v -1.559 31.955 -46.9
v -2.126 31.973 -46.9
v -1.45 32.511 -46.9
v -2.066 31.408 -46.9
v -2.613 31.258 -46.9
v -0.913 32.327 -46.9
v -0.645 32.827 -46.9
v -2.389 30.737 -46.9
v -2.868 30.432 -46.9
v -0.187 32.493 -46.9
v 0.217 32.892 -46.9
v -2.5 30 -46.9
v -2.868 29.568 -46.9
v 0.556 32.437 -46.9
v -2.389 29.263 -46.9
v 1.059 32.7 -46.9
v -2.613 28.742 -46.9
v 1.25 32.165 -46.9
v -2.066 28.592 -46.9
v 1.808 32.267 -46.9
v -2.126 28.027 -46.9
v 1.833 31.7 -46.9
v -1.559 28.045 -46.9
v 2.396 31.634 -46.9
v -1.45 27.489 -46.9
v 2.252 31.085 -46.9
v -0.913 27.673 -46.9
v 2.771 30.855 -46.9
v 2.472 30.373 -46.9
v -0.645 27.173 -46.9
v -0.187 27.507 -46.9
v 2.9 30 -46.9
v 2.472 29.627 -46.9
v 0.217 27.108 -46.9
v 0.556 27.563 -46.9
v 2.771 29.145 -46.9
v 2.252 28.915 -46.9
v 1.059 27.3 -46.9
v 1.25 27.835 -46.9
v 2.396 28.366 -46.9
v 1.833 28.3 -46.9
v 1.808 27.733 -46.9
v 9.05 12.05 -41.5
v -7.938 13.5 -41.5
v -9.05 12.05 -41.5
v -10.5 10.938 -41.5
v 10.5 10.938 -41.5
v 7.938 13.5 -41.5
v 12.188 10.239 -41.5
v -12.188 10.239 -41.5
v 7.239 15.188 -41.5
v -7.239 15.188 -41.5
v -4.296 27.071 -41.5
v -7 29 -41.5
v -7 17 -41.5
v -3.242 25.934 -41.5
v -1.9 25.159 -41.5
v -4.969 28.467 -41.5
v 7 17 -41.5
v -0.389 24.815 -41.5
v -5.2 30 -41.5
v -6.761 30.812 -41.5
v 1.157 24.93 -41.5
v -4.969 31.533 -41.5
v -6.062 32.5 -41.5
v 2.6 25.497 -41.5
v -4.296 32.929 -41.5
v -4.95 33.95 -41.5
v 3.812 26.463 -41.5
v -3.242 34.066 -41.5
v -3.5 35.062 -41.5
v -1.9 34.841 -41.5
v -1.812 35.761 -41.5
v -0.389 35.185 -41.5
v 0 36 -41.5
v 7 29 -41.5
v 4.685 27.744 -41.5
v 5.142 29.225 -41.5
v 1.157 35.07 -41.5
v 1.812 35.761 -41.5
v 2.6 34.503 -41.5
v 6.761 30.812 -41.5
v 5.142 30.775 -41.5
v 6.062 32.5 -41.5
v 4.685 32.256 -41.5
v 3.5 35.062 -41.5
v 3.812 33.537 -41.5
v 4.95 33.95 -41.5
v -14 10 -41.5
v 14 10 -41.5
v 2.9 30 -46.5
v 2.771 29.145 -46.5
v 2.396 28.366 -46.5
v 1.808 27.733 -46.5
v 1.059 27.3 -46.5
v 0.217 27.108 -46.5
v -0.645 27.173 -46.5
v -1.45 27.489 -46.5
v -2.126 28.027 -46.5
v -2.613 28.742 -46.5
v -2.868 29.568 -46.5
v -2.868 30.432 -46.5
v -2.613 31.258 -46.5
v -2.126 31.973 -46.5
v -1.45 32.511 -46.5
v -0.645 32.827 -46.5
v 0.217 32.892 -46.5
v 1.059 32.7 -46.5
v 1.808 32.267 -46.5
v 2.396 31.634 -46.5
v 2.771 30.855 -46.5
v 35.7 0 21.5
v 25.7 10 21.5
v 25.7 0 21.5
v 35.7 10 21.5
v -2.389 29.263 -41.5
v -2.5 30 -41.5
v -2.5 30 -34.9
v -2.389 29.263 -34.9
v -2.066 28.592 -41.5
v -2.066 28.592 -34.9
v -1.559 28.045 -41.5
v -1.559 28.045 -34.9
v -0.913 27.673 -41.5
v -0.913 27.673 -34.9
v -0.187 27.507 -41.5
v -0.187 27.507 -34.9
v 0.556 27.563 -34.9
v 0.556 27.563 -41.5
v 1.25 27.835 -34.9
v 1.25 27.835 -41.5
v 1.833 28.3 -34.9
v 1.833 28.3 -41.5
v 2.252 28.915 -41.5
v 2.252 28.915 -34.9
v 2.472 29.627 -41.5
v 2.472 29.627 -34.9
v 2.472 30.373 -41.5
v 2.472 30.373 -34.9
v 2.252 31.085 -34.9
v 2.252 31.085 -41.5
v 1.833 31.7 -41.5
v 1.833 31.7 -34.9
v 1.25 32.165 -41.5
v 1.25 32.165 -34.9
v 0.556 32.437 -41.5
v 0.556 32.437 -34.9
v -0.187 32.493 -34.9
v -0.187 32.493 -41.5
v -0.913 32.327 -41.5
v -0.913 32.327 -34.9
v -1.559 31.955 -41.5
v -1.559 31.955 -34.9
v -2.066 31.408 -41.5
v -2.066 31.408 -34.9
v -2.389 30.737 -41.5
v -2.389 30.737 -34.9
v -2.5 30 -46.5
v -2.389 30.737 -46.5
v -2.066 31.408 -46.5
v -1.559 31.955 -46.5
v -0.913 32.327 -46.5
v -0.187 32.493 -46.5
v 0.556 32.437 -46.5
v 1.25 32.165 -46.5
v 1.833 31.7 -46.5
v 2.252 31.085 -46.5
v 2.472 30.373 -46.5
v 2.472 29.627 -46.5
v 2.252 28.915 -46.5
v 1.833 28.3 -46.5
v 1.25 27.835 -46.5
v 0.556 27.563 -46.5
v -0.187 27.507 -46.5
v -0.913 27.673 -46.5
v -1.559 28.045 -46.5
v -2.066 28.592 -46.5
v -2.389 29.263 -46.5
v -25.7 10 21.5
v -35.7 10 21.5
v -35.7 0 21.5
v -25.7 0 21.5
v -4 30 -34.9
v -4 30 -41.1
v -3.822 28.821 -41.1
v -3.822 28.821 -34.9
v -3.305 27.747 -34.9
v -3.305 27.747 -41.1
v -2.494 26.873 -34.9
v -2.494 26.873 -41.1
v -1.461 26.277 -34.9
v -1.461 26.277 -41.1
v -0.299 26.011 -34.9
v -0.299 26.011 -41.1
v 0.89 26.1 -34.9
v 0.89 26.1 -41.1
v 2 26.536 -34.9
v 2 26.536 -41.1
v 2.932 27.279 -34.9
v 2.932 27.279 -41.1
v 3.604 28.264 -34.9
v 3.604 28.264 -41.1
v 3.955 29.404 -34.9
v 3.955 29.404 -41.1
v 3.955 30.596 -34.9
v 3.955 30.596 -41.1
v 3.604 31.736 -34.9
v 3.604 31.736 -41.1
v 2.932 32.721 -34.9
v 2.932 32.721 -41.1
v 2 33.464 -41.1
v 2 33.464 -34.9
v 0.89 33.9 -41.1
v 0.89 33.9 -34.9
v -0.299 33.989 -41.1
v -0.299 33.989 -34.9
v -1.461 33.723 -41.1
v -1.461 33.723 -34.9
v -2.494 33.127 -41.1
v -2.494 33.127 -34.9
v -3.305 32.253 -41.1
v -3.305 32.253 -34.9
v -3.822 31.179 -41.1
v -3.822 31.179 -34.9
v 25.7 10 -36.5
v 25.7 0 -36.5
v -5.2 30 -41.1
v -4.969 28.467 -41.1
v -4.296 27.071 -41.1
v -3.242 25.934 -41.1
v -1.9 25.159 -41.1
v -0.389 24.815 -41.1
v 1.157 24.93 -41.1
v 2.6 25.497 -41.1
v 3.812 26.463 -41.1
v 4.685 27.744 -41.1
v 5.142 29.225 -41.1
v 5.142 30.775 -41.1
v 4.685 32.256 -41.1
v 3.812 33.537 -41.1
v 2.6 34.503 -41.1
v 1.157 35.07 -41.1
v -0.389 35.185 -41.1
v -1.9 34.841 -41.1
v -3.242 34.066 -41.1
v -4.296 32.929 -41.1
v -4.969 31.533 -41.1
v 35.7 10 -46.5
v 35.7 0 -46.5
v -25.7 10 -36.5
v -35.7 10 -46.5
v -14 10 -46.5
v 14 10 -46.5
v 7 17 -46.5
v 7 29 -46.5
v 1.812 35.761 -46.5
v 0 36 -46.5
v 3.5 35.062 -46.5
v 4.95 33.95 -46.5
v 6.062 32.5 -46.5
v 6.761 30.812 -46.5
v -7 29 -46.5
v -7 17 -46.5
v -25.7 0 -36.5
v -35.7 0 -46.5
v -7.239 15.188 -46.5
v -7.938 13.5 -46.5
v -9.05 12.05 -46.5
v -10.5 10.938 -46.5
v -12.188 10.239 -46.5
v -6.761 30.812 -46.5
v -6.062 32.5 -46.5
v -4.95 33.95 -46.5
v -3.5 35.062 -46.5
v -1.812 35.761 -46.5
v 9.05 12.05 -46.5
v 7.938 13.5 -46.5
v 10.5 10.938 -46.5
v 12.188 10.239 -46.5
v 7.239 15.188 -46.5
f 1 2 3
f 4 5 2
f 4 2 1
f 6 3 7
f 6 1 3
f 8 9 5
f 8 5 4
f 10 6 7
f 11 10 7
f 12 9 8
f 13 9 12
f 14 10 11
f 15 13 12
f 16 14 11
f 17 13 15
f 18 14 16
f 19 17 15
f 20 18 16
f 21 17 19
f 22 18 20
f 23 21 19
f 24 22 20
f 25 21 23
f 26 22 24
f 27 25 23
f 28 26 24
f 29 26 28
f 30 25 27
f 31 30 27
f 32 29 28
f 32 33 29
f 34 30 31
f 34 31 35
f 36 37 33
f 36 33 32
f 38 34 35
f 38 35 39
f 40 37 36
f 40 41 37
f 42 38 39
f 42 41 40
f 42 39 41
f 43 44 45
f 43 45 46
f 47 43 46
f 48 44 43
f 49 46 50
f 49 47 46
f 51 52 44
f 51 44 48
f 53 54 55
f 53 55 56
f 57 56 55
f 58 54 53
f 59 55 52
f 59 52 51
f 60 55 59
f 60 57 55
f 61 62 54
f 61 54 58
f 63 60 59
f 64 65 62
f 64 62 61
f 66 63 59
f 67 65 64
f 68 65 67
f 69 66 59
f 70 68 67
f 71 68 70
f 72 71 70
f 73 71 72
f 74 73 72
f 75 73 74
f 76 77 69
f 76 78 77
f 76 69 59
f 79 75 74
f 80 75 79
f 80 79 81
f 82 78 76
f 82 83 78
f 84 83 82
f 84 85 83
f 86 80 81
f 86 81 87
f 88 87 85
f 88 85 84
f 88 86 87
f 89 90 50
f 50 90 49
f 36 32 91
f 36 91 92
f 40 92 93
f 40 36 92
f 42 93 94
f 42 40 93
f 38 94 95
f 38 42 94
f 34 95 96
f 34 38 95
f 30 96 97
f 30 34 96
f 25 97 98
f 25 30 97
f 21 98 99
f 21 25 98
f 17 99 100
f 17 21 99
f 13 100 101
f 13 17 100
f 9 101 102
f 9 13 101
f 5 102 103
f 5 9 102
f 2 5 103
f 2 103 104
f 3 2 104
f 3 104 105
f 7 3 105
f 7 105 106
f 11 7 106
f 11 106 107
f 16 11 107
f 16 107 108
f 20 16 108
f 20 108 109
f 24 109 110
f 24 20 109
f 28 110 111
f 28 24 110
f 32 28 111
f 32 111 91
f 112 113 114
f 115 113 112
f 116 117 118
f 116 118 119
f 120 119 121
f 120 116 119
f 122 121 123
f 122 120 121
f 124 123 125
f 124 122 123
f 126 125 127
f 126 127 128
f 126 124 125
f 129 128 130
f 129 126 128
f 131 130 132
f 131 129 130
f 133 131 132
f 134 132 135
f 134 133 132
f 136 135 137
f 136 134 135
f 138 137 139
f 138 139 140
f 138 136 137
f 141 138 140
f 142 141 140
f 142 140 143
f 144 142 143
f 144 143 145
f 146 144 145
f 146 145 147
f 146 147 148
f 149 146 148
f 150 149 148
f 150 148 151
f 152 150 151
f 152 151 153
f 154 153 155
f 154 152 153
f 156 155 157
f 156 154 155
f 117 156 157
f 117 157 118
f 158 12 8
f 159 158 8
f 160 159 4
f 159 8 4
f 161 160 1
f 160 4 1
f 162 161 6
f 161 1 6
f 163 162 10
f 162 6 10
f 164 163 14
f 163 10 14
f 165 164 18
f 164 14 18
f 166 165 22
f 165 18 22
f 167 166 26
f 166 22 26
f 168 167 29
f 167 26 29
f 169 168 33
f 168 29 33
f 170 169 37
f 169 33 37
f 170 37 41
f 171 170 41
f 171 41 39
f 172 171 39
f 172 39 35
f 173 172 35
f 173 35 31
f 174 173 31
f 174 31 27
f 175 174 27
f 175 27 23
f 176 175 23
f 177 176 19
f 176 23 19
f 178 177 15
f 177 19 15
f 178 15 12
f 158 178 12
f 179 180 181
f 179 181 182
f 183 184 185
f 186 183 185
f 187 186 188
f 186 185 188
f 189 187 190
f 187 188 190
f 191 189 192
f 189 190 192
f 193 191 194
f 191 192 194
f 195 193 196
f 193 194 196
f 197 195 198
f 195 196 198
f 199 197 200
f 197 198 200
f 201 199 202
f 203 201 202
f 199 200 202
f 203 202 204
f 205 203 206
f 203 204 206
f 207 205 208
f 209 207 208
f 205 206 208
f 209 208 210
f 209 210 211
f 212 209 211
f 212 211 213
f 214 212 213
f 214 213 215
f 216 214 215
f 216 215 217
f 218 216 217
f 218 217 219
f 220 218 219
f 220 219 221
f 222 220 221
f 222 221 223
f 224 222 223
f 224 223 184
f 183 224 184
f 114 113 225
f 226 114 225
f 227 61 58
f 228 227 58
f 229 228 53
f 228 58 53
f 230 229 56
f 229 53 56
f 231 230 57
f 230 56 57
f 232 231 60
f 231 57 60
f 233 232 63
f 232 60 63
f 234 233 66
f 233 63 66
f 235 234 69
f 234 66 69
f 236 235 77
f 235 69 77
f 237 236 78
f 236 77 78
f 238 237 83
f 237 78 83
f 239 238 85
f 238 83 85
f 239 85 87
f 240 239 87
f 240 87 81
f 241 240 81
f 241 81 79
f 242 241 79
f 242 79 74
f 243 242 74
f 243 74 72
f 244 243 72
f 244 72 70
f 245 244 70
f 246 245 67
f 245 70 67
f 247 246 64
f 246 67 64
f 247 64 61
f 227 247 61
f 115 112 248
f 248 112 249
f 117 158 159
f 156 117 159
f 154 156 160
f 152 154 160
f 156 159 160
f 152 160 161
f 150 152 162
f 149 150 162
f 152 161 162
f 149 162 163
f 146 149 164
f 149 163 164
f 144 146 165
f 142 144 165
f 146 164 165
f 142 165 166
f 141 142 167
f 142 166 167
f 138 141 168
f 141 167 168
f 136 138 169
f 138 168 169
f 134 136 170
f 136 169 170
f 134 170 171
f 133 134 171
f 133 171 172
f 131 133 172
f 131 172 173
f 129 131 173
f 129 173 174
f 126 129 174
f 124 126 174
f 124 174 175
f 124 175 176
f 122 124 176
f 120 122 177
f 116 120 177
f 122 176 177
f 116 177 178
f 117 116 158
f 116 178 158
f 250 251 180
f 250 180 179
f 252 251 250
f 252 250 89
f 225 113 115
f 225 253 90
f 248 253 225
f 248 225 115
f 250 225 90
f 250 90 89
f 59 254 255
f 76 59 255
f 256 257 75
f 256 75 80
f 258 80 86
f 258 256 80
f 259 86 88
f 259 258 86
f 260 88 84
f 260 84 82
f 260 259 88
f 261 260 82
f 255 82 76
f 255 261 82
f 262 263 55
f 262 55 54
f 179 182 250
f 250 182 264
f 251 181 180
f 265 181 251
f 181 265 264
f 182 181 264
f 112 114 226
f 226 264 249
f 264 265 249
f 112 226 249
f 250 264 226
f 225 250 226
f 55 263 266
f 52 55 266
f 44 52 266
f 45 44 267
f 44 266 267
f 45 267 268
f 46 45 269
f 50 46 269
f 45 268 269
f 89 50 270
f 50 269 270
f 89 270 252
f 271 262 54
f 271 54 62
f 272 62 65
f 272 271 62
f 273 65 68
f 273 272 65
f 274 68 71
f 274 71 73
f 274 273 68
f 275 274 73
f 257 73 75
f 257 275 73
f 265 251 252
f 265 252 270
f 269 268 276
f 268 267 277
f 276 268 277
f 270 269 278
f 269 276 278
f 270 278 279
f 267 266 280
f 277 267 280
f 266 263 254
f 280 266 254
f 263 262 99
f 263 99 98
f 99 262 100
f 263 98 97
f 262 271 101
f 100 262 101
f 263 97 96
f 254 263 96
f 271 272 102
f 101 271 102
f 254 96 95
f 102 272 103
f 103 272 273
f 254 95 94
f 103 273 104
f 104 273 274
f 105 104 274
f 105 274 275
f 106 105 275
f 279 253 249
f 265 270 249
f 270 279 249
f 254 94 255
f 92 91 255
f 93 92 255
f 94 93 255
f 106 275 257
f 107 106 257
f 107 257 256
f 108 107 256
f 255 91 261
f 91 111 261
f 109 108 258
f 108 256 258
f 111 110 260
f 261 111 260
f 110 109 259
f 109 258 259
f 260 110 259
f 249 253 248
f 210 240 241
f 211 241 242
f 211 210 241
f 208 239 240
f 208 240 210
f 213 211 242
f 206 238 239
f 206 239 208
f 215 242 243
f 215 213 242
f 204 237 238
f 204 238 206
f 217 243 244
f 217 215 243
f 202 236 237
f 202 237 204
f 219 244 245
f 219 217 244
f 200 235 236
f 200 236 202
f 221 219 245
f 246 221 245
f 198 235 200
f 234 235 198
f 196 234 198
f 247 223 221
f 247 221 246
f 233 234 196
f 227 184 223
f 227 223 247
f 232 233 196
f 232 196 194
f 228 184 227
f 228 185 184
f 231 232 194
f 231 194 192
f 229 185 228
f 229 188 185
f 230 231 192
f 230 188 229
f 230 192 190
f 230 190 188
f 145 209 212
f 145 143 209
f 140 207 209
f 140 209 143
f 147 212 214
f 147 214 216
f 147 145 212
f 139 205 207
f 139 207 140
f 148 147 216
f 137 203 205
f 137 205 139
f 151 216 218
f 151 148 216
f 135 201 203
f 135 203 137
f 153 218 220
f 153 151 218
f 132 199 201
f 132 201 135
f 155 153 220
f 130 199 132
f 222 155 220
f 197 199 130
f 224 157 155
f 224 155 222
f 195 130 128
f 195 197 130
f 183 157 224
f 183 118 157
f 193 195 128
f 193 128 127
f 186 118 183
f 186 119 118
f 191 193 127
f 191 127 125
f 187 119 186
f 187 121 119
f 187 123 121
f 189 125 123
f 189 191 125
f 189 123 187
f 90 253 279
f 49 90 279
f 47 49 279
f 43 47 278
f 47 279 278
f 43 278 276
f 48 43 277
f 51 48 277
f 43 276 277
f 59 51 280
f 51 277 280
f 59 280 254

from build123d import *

# Parameters (mm, degrees)
SKETCH2_W           = 71.4
SKETCH2_H           = 93
SKETCH2_W_2         = 51.4
SKETCH2_H_2         = 73
BOSS_EXTRUDE1_DEPTH = 10
SKETCH3_W           = 14
SKETCH3_H           = 26
SKETCH3_R           = 2.5
BOSS_EXTRUDE2_DEPTH = 5
SKETCH4_R           = 4
SKETCH4_R_2         = 2.5
BOSS_EXTRUDE3_DEPTH = 6.6
SKETCH5_W           = 51.4
SKETCH5_H           = 10
CUT_EXTRUDE1_DEPTH  = 65.130647899
SKETCH6_R           = 5.2
SKETCH6_R_2         = 4
BOSS_EXTRUDE4_DEPTH = 0.4
SKETCH7_W           = 71.4
SKETCH7_H           = 25
CUT_EXTRUDE2_DEPTH  = 65.130647899
BOSS_EXTRUDE5_START = 0.4
SKETCH8_R           = 2.9
SKETCH8_R_2         = 2.5
BOSS_EXTRUDE5_DEPTH = 0.4
FILLET1_START       = -46.5
FILLET1_DEPTH       = 5
FILLET1_2_DEPTH     = 5


with BuildPart() as part:
    # Sketch2 → Boss-Extrude1 (new body)
    with BuildSketch(Plane(origin=(0, 0, 0), x_dir=(1, 0, 0), z_dir=(0, 1, 0))):
        Rectangle(SKETCH2_W, SKETCH2_H)
        Rectangle(SKETCH2_W_2, SKETCH2_H_2, mode=Mode.SUBTRACT)
    extrude(amount=BOSS_EXTRUDE1_DEPTH)

    # Sketch3 → Boss-Extrude2 (add)
    with BuildSketch(Plane(origin=(0, 0, -46.5), x_dir=(-1, 0, 0), z_dir=(0, 0, -1))):
        with Locations((0, 23)):
            Rectangle(SKETCH3_W, SKETCH3_H)
        with Locations((0, 30)):
            Circle(SKETCH3_R, mode=Mode.SUBTRACT)
    extrude(amount=-BOSS_EXTRUDE2_DEPTH)

    # Sketch4 → Boss-Extrude3 (add)
    with BuildSketch(Plane.XY.offset(-41.5)):
        with Locations(Location((0, 30, 0), (0, 0, 180))):
            Circle(SKETCH4_R)
        with Locations(Location((0, 30, 0), (0, 0, 180))):
            Circle(SKETCH4_R_2, mode=Mode.SUBTRACT)
    extrude(amount=BOSS_EXTRUDE3_DEPTH)

    # Sketch5 → Cut-Extrude1 (cut, through all)
    with BuildSketch(Plane(origin=(0, 10, 0), x_dir=(1, 0, 0), z_dir=(0, 1, 0))):
        with Locations((0, -41.5)):
            Rectangle(SKETCH5_W, SKETCH5_H)
    extrude(amount=-CUT_EXTRUDE1_DEPTH, mode=Mode.SUBTRACT)

    # Sketch6 → Boss-Extrude4 (add)
    with BuildSketch(Plane.XY.offset(-41.5)):
        with Locations(Location((0, 30, 0), (0, 0, 180))):
            Circle(SKETCH6_R)
        with Locations((0, 30)):
            Circle(SKETCH6_R_2, mode=Mode.SUBTRACT)
    extrude(amount=BOSS_EXTRUDE4_DEPTH)

    # Sketch7 → Cut-Extrude2 (cut, through all)
    with BuildSketch(Plane(origin=(0, 10, 0), x_dir=(1, 0, 0), z_dir=(0, 1, 0))):
        with Locations((0, -34)):
            Rectangle(SKETCH7_W, SKETCH7_H)
    extrude(amount=-CUT_EXTRUDE2_DEPTH, mode=Mode.SUBTRACT)

    # Sketch8 → Boss-Extrude5 (add)
    with BuildSketch(Plane(origin=(0, 0, -46.5), x_dir=(-1, 0, 0), z_dir=(0, 0, -1)).offset(BOSS_EXTRUDE5_START)):
        with Locations(Location((0, 30, 0), (0, 0, 180))):
            Circle(SKETCH8_R)
        with Locations((0, 30)):
            Circle(SKETCH8_R_2, mode=Mode.SUBTRACT)
    extrude(amount=-BOSS_EXTRUDE5_DEPTH)

    # Fillet1: read off the stored shape, not the designer's step
    # Fillet1 outline → Fillet1 (cut)
    with BuildSketch(Plane.XY.offset(FILLET1_START)):
        with BuildLine():
            ThreePointArc((0, 36), (4.949747468, 33.949747468), (7, 29))
            Line((7, 29), (7, 36))
            Line((7, 36), (0, 36))
        make_face()
        with BuildLine():
            ThreePointArc((-7, 29), (-4.949747468, 33.949747468), (0, 36))
            Line((0, 36), (-7, 36))
            Line((-7, 36), (-7, 29))
        make_face()
    extrude(amount=FILLET1_DEPTH, mode=Mode.SUBTRACT)

    # Fillet1 2 outline → Fillet1 2 (add)
    with BuildSketch(Plane.XY.offset(FILLET1_START)):
        with BuildLine():
            ThreePointArc((14, 10), (9.050252532, 12.050252532), (7, 17))
            Line((7, 17), (7, 10))
            Line((7, 10), (14, 10))
        make_face()
        with BuildLine():
            Line((-14, 10), (-7, 10))
            Line((-7, 10), (-7, 17))
            ThreePointArc((-7, 17), (-9.050252532, 12.050252532), (-14, 10))
        make_face()
    extrude(amount=FILLET1_2_DEPTH)


solid = part.part
